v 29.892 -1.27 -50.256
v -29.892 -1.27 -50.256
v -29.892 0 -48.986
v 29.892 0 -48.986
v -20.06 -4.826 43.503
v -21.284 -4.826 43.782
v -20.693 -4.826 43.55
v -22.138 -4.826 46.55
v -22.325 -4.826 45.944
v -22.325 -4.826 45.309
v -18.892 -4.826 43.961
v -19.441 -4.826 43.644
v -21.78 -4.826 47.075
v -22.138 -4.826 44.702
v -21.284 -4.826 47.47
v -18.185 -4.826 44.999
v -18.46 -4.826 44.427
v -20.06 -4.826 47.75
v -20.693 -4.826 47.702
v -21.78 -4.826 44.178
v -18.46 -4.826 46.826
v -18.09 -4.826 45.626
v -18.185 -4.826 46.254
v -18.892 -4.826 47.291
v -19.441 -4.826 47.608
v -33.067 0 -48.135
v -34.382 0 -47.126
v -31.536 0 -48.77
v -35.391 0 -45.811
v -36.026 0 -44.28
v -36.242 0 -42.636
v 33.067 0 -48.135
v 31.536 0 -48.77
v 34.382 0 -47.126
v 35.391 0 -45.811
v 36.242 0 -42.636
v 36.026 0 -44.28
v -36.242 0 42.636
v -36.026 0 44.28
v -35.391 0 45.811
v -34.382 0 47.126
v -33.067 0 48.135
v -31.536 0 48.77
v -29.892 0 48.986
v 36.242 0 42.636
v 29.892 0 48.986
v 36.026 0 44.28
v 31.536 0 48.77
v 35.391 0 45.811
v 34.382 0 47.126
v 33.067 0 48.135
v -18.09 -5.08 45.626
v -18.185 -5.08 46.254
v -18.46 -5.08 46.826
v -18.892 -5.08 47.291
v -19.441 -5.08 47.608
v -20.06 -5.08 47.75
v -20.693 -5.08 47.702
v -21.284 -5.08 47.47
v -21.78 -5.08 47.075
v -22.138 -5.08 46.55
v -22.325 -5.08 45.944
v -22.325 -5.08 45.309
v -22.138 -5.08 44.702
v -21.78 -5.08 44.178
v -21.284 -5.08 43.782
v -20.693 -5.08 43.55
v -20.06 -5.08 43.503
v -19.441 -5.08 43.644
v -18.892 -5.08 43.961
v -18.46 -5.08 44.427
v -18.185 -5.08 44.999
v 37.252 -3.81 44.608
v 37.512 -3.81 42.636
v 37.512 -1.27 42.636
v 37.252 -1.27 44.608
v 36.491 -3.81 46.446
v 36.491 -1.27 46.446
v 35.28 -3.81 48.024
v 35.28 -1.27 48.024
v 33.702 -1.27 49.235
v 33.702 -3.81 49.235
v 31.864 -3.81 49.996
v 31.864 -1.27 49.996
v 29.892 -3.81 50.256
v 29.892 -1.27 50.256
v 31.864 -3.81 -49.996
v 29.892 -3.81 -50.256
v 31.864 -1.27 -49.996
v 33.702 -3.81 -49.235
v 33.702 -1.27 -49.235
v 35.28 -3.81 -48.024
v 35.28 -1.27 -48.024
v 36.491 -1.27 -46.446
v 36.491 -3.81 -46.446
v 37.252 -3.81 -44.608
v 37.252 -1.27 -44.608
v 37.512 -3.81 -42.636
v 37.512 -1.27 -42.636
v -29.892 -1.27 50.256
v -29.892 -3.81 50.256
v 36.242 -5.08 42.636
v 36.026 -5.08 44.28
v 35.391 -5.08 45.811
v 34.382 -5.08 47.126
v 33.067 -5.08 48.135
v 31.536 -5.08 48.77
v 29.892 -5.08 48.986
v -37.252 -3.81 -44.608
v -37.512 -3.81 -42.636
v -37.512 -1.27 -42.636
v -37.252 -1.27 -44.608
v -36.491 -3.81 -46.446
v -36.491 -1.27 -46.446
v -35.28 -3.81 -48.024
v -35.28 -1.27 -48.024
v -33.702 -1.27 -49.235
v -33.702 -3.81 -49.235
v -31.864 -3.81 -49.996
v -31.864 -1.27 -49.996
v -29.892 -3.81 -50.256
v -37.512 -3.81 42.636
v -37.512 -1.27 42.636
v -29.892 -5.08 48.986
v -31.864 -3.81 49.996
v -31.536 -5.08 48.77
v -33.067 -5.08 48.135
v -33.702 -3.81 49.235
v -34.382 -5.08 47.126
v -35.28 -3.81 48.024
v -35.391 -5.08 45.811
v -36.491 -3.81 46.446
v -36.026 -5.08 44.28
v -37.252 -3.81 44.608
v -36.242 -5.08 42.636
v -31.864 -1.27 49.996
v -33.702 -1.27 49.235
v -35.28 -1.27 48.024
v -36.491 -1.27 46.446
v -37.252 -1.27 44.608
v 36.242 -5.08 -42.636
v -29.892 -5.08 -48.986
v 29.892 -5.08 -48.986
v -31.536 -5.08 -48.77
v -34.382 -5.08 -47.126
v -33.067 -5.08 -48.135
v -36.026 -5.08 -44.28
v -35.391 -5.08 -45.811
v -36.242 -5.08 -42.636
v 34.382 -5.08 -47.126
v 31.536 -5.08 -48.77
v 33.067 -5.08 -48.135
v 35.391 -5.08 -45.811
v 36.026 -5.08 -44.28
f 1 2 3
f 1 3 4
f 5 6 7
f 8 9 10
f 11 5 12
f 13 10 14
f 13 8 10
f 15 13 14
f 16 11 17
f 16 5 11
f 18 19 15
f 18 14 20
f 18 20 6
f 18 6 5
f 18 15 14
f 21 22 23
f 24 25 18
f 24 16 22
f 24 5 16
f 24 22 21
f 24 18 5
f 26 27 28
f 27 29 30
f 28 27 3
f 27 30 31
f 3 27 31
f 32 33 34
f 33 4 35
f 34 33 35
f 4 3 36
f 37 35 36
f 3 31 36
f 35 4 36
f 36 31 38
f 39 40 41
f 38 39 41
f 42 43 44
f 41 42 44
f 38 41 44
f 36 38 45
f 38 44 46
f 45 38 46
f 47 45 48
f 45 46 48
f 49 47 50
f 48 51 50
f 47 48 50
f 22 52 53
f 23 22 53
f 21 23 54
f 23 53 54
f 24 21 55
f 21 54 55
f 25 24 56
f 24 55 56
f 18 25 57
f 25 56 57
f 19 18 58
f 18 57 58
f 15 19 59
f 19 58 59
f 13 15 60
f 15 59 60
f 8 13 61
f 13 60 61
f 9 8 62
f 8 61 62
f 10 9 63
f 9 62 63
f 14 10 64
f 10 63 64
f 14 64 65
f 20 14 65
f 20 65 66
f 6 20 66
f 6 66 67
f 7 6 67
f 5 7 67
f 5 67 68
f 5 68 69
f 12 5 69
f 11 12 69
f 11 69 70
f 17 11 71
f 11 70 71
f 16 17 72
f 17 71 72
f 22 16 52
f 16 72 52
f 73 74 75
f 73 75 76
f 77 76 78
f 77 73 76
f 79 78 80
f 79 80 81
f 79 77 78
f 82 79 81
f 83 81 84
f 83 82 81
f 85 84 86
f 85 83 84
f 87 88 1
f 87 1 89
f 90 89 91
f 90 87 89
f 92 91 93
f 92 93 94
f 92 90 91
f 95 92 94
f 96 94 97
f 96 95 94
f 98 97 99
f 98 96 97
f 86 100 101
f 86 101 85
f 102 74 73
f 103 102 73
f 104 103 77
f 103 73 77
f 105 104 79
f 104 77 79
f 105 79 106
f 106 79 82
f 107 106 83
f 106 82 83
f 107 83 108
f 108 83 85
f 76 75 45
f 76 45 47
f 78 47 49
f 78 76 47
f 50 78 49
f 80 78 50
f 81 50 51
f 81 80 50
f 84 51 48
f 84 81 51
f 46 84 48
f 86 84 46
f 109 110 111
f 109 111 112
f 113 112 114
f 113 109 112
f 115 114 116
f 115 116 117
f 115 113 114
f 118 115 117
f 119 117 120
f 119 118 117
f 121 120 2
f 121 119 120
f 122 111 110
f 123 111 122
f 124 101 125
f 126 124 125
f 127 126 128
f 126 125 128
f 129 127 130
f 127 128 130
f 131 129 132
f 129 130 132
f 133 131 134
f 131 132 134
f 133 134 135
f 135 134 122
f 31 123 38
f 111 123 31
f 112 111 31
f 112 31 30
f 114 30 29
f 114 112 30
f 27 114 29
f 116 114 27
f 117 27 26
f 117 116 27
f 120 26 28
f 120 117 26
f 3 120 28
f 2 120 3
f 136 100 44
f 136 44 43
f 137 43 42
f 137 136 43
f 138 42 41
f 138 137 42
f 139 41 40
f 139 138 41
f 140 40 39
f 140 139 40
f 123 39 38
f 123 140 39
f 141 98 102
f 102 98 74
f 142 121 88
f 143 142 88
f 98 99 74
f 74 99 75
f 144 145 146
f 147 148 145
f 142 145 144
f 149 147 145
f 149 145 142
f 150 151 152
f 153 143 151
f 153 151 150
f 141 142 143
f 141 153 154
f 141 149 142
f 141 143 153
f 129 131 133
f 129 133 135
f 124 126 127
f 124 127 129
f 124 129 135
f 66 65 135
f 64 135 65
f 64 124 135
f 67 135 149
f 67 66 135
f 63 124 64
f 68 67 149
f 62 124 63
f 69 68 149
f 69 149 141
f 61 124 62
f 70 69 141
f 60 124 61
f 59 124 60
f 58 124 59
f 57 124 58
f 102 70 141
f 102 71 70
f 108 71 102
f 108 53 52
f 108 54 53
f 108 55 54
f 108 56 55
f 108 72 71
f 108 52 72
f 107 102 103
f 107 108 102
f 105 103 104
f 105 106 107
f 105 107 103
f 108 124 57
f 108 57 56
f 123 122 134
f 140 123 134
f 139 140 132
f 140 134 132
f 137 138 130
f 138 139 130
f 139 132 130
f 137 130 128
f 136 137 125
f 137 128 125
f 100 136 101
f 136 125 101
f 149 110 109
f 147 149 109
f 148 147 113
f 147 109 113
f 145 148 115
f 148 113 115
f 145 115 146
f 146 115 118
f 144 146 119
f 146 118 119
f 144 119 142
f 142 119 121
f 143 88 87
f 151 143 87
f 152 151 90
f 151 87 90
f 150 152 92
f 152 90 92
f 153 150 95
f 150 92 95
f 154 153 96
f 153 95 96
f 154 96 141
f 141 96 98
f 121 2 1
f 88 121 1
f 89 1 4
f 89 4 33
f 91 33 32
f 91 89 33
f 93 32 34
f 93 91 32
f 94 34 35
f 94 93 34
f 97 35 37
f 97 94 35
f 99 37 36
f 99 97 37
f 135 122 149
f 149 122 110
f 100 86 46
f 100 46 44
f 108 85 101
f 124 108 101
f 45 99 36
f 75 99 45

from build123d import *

# Parameters (mm, degrees)
F0_W     = 75.02421
F0_H     = 100.512072
F1_DEPTH = 5.08
F2_R     = 7.62
F3_SIZE  = 1.27
F4_R     = 2.129316
F5_DEPTH = 0.254
F6_SIZE  = 1.27


with BuildPart() as f1:
    # F0 (on Front) → F1 (new body)
    with BuildSketch(Plane.XZ):
        Rectangle(F0_W, F0_H)
    extrude(amount=F1_DEPTH)

    # F2
    f2_edges = [f1.edges().sort_by_distance(p)[0] for p in [
        (-37.512105, -2.54, 50.256036),
        (-37.512105, -2.54, -50.256036),
        (37.512105, -2.54, 50.256036),
        (37.512105, -2.54, -50.256036),
    ]]
    fillet(f2_edges, radius=F2_R)

    # F3
    f3_edges = [f1.edges().sort_by_distance(p)[0] for p in [
        (0, -5.08, -50.256036),
        (-35.280259, -5.08, -48.02419),
        (35.280259, -5.08, -48.02419),
        (-37.512105, -5.08, 0),
        (37.512105, -5.08, 0),
        (-35.280259, -5.08, 48.02419),
        (35.280259, -5.08, 48.02419),
        (0, -5.08, 50.256036),
    ]]
    chamfer(f3_edges, length=F3_SIZE)

    # F4 (on face) → F5 (cut)
    with BuildSketch(Plane.XZ.offset(5.08)):
        with Locations((-20.219289, 45.626208)):
            Circle(F4_R)
    extrude(amount=-F5_DEPTH, mode=Mode.SUBTRACT)

    # F6
    f6_edges = [f1.edges().sort_by_distance(p)[0] for p in [
        (0, 0, -50.256036),
        (-35.280259, 0, -48.02419),
        (35.280259, 0, -48.02419),
        (-37.512105, 0, 0),
        (37.512105, 0, 0),
        (-35.280259, 0, 48.02419),
        (35.280259, 0, 48.02419),
        (0, 0, 50.256036),
    ]]
    chamfer(f6_edges, length=F6_SIZE)


solid = f1.part
